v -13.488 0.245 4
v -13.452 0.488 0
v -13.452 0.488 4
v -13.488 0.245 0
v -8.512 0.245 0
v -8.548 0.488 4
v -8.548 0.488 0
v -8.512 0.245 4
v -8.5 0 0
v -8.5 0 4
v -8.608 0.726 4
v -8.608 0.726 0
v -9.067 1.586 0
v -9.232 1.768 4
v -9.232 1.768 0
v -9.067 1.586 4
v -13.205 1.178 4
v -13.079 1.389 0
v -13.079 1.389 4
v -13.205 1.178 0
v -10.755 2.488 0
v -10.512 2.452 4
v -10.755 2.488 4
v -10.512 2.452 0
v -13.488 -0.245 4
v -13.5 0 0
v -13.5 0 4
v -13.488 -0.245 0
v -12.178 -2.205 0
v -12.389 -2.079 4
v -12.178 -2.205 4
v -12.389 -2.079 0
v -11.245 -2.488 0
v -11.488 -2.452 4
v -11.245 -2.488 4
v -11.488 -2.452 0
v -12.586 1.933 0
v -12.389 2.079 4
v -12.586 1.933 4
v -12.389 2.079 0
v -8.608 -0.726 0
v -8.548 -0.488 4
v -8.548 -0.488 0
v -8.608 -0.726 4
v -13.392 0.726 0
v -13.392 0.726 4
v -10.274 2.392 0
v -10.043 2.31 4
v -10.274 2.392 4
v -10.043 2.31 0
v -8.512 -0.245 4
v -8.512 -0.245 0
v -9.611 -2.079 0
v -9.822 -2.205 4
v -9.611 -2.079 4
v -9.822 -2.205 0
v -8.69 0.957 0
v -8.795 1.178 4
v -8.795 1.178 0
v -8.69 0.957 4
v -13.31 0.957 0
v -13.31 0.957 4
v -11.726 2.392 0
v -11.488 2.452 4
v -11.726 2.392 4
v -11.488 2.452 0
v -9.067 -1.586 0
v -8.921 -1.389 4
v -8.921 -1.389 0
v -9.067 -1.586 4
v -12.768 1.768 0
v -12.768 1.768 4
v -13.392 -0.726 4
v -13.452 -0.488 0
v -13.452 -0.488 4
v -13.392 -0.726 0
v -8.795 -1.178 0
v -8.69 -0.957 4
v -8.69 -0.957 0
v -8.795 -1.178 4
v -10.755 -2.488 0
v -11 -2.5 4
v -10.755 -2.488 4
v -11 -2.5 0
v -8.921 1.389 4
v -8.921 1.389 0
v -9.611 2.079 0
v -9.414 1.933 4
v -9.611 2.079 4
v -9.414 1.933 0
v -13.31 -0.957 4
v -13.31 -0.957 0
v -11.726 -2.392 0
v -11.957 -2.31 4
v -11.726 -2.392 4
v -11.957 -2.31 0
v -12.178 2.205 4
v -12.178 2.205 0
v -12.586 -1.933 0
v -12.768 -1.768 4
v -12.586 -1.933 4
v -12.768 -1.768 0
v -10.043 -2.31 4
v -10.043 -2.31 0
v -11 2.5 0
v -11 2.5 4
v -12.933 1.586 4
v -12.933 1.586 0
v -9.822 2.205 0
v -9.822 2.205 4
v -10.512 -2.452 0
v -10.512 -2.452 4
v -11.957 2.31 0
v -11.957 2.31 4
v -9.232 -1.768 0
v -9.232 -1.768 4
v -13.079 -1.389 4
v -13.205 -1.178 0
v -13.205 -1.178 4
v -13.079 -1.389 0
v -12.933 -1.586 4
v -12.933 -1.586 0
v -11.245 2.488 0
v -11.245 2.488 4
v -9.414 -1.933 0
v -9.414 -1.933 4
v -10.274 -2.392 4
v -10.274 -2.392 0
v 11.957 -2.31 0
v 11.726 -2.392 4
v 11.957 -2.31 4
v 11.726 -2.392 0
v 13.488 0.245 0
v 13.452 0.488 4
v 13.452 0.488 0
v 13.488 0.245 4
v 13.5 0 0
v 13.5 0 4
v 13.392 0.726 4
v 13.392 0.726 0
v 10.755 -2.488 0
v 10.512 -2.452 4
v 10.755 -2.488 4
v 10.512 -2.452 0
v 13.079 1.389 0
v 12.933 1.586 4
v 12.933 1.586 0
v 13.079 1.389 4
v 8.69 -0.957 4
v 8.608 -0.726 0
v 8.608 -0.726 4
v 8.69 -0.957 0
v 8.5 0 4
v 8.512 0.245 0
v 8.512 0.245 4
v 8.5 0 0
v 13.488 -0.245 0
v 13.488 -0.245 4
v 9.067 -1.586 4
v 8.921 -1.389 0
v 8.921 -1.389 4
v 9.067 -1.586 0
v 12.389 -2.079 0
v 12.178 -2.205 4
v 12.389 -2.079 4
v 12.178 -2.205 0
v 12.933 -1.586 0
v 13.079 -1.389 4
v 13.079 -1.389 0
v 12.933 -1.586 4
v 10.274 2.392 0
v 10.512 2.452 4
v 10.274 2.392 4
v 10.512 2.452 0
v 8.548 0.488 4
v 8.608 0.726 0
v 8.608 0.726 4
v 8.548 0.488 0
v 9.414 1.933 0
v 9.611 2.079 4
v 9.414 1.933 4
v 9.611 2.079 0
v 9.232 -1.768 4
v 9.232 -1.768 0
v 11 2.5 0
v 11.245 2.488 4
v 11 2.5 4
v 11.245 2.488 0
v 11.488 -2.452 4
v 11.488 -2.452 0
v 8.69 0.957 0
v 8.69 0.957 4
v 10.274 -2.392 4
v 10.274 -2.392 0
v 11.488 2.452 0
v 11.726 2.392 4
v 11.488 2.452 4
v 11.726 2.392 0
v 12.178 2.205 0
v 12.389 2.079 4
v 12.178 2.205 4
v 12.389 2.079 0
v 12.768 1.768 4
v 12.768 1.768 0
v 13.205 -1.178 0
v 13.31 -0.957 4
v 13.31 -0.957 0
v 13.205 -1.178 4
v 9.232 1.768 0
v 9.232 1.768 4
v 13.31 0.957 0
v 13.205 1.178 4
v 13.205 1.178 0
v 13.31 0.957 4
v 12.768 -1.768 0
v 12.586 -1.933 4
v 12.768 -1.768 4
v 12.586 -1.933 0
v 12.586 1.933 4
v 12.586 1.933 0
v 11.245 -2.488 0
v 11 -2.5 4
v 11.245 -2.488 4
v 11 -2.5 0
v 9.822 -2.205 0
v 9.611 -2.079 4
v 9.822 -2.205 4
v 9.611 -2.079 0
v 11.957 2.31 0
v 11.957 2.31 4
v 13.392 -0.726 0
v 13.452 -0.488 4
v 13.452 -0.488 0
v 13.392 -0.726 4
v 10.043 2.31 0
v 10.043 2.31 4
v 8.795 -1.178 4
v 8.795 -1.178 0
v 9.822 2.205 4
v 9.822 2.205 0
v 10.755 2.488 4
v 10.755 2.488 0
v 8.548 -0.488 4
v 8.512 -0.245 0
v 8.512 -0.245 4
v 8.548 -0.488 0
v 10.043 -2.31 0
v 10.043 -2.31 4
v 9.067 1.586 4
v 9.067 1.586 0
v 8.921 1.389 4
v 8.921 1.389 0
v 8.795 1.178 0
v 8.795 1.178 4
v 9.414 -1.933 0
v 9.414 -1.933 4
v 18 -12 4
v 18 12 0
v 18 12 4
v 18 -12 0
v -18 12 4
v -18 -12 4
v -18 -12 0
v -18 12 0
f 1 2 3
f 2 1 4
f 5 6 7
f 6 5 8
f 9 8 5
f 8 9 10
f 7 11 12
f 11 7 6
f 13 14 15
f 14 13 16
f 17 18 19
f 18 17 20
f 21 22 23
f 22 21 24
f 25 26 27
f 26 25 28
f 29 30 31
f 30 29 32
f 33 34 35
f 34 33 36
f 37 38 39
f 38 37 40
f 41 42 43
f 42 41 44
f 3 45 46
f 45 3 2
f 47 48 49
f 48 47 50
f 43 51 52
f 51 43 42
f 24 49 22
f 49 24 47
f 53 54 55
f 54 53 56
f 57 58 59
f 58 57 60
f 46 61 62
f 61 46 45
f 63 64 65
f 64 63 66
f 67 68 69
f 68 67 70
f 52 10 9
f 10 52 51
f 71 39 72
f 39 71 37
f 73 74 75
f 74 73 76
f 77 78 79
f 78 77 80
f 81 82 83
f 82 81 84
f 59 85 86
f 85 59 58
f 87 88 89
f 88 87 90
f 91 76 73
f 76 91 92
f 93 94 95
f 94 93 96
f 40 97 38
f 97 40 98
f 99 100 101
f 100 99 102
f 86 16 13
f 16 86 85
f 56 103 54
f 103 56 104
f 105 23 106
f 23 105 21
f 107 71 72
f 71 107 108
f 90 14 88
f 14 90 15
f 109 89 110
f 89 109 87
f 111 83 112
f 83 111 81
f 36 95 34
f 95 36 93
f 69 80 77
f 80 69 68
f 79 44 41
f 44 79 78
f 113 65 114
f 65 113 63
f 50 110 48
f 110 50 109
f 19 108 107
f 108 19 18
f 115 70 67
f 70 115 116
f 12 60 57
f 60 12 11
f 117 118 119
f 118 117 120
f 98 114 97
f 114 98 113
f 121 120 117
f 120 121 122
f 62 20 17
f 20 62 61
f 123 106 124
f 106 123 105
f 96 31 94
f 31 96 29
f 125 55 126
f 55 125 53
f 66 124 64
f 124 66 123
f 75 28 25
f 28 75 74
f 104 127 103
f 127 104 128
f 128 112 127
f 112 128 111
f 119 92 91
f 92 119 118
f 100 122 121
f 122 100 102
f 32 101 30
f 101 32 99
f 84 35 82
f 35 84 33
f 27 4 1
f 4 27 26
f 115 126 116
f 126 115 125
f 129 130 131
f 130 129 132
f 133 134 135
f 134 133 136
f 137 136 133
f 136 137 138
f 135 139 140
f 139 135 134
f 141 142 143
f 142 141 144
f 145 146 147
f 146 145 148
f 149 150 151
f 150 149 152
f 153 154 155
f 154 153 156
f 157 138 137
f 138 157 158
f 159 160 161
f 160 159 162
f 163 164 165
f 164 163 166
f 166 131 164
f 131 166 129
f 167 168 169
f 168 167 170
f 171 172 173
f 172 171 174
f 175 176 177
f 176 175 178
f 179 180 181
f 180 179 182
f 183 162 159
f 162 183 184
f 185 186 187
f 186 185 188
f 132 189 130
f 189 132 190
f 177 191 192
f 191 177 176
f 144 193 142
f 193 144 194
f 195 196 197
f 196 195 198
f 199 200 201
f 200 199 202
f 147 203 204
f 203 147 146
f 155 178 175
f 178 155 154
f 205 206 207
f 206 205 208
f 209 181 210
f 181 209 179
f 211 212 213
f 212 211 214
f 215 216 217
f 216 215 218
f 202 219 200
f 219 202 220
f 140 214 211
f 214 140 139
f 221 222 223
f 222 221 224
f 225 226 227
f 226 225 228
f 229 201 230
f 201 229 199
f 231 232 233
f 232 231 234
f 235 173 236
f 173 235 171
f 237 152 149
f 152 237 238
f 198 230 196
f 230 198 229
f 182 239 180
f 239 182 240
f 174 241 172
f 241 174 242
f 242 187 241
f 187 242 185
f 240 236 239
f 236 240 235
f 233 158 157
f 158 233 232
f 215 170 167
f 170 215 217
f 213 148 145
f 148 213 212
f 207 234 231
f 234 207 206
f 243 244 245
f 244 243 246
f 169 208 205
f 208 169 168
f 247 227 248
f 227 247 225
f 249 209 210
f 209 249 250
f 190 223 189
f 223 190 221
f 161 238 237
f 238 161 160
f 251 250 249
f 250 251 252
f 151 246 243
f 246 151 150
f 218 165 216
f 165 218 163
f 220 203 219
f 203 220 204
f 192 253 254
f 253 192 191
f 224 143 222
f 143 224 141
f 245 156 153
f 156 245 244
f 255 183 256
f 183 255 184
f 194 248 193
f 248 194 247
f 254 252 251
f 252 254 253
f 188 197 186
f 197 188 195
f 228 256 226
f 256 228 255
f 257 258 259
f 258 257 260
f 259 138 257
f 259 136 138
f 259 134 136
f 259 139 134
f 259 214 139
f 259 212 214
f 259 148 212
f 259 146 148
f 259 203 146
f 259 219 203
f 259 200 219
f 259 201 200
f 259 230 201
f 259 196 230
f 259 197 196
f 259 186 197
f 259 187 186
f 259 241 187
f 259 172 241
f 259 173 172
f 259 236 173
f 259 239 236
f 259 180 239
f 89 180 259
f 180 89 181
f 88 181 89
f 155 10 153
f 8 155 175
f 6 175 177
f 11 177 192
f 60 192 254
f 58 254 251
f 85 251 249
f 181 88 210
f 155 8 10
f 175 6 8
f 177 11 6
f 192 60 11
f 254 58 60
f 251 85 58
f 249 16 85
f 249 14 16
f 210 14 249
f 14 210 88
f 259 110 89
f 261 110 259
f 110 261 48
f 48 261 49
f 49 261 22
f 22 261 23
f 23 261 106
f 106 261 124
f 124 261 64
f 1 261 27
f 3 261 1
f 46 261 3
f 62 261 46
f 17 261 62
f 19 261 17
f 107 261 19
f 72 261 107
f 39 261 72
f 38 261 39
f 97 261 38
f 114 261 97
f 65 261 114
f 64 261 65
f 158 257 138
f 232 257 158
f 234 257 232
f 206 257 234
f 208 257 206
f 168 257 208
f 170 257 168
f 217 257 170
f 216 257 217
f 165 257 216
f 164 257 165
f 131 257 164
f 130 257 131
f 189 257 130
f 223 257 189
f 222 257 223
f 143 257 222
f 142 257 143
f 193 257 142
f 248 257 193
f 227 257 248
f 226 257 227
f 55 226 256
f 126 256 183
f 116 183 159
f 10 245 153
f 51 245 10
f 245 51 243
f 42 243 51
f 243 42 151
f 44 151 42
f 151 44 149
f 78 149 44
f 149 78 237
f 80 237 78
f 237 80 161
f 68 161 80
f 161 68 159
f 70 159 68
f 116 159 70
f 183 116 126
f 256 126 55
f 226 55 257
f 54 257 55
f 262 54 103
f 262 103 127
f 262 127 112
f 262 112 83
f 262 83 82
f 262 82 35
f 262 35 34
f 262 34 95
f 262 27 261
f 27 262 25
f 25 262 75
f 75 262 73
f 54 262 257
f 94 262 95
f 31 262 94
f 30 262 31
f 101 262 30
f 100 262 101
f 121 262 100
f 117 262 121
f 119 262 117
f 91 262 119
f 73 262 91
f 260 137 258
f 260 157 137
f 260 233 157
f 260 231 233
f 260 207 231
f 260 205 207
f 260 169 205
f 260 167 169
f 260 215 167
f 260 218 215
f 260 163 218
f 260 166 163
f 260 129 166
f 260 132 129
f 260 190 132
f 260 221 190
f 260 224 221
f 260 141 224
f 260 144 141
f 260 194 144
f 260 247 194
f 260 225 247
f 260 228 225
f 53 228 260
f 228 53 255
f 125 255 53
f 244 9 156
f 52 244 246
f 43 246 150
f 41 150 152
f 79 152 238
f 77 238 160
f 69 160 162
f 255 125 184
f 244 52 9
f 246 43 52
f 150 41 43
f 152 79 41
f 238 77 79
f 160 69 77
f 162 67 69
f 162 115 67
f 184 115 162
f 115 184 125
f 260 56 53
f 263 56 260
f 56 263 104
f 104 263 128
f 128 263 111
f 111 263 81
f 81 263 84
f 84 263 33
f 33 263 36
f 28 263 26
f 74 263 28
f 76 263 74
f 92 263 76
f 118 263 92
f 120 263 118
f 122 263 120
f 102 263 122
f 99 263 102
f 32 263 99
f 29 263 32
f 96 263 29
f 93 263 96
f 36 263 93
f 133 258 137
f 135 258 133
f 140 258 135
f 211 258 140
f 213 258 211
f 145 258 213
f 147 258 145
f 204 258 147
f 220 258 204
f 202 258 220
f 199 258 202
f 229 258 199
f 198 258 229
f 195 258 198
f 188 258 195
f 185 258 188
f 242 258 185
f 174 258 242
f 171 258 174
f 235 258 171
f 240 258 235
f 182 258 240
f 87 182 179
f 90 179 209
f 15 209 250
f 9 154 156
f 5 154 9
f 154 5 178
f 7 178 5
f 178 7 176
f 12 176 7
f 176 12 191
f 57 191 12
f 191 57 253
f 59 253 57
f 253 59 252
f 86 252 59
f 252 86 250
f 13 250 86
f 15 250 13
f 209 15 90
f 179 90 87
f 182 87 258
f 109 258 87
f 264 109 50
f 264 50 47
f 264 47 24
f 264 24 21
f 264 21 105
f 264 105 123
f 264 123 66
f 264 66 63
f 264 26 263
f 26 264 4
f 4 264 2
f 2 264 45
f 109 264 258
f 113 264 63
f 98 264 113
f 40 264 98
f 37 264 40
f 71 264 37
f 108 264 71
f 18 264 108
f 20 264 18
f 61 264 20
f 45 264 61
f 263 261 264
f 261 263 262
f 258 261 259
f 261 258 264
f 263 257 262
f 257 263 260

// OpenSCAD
// Parametric two-hole mounting plate used to exercise the OpenSCAD backend.
// All dimensions are in millimeters.
PLATE_WIDTH = 36;
PLATE_DEPTH = 24;
PLATE_THICKNESS = 4;
HOLE_DIAMETER = 5;
HOLE_SPACING = 22;

$fn = 64;

difference() {
    translate([-PLATE_WIDTH / 2, -PLATE_DEPTH / 2, 0])
        cube([PLATE_WIDTH, PLATE_DEPTH, PLATE_THICKNESS]);

    for (x = [-HOLE_SPACING / 2, HOLE_SPACING / 2])
        translate([x, 0, -1])
            cylinder(h = PLATE_THICKNESS + 2, d = HOLE_DIAMETER);
}
